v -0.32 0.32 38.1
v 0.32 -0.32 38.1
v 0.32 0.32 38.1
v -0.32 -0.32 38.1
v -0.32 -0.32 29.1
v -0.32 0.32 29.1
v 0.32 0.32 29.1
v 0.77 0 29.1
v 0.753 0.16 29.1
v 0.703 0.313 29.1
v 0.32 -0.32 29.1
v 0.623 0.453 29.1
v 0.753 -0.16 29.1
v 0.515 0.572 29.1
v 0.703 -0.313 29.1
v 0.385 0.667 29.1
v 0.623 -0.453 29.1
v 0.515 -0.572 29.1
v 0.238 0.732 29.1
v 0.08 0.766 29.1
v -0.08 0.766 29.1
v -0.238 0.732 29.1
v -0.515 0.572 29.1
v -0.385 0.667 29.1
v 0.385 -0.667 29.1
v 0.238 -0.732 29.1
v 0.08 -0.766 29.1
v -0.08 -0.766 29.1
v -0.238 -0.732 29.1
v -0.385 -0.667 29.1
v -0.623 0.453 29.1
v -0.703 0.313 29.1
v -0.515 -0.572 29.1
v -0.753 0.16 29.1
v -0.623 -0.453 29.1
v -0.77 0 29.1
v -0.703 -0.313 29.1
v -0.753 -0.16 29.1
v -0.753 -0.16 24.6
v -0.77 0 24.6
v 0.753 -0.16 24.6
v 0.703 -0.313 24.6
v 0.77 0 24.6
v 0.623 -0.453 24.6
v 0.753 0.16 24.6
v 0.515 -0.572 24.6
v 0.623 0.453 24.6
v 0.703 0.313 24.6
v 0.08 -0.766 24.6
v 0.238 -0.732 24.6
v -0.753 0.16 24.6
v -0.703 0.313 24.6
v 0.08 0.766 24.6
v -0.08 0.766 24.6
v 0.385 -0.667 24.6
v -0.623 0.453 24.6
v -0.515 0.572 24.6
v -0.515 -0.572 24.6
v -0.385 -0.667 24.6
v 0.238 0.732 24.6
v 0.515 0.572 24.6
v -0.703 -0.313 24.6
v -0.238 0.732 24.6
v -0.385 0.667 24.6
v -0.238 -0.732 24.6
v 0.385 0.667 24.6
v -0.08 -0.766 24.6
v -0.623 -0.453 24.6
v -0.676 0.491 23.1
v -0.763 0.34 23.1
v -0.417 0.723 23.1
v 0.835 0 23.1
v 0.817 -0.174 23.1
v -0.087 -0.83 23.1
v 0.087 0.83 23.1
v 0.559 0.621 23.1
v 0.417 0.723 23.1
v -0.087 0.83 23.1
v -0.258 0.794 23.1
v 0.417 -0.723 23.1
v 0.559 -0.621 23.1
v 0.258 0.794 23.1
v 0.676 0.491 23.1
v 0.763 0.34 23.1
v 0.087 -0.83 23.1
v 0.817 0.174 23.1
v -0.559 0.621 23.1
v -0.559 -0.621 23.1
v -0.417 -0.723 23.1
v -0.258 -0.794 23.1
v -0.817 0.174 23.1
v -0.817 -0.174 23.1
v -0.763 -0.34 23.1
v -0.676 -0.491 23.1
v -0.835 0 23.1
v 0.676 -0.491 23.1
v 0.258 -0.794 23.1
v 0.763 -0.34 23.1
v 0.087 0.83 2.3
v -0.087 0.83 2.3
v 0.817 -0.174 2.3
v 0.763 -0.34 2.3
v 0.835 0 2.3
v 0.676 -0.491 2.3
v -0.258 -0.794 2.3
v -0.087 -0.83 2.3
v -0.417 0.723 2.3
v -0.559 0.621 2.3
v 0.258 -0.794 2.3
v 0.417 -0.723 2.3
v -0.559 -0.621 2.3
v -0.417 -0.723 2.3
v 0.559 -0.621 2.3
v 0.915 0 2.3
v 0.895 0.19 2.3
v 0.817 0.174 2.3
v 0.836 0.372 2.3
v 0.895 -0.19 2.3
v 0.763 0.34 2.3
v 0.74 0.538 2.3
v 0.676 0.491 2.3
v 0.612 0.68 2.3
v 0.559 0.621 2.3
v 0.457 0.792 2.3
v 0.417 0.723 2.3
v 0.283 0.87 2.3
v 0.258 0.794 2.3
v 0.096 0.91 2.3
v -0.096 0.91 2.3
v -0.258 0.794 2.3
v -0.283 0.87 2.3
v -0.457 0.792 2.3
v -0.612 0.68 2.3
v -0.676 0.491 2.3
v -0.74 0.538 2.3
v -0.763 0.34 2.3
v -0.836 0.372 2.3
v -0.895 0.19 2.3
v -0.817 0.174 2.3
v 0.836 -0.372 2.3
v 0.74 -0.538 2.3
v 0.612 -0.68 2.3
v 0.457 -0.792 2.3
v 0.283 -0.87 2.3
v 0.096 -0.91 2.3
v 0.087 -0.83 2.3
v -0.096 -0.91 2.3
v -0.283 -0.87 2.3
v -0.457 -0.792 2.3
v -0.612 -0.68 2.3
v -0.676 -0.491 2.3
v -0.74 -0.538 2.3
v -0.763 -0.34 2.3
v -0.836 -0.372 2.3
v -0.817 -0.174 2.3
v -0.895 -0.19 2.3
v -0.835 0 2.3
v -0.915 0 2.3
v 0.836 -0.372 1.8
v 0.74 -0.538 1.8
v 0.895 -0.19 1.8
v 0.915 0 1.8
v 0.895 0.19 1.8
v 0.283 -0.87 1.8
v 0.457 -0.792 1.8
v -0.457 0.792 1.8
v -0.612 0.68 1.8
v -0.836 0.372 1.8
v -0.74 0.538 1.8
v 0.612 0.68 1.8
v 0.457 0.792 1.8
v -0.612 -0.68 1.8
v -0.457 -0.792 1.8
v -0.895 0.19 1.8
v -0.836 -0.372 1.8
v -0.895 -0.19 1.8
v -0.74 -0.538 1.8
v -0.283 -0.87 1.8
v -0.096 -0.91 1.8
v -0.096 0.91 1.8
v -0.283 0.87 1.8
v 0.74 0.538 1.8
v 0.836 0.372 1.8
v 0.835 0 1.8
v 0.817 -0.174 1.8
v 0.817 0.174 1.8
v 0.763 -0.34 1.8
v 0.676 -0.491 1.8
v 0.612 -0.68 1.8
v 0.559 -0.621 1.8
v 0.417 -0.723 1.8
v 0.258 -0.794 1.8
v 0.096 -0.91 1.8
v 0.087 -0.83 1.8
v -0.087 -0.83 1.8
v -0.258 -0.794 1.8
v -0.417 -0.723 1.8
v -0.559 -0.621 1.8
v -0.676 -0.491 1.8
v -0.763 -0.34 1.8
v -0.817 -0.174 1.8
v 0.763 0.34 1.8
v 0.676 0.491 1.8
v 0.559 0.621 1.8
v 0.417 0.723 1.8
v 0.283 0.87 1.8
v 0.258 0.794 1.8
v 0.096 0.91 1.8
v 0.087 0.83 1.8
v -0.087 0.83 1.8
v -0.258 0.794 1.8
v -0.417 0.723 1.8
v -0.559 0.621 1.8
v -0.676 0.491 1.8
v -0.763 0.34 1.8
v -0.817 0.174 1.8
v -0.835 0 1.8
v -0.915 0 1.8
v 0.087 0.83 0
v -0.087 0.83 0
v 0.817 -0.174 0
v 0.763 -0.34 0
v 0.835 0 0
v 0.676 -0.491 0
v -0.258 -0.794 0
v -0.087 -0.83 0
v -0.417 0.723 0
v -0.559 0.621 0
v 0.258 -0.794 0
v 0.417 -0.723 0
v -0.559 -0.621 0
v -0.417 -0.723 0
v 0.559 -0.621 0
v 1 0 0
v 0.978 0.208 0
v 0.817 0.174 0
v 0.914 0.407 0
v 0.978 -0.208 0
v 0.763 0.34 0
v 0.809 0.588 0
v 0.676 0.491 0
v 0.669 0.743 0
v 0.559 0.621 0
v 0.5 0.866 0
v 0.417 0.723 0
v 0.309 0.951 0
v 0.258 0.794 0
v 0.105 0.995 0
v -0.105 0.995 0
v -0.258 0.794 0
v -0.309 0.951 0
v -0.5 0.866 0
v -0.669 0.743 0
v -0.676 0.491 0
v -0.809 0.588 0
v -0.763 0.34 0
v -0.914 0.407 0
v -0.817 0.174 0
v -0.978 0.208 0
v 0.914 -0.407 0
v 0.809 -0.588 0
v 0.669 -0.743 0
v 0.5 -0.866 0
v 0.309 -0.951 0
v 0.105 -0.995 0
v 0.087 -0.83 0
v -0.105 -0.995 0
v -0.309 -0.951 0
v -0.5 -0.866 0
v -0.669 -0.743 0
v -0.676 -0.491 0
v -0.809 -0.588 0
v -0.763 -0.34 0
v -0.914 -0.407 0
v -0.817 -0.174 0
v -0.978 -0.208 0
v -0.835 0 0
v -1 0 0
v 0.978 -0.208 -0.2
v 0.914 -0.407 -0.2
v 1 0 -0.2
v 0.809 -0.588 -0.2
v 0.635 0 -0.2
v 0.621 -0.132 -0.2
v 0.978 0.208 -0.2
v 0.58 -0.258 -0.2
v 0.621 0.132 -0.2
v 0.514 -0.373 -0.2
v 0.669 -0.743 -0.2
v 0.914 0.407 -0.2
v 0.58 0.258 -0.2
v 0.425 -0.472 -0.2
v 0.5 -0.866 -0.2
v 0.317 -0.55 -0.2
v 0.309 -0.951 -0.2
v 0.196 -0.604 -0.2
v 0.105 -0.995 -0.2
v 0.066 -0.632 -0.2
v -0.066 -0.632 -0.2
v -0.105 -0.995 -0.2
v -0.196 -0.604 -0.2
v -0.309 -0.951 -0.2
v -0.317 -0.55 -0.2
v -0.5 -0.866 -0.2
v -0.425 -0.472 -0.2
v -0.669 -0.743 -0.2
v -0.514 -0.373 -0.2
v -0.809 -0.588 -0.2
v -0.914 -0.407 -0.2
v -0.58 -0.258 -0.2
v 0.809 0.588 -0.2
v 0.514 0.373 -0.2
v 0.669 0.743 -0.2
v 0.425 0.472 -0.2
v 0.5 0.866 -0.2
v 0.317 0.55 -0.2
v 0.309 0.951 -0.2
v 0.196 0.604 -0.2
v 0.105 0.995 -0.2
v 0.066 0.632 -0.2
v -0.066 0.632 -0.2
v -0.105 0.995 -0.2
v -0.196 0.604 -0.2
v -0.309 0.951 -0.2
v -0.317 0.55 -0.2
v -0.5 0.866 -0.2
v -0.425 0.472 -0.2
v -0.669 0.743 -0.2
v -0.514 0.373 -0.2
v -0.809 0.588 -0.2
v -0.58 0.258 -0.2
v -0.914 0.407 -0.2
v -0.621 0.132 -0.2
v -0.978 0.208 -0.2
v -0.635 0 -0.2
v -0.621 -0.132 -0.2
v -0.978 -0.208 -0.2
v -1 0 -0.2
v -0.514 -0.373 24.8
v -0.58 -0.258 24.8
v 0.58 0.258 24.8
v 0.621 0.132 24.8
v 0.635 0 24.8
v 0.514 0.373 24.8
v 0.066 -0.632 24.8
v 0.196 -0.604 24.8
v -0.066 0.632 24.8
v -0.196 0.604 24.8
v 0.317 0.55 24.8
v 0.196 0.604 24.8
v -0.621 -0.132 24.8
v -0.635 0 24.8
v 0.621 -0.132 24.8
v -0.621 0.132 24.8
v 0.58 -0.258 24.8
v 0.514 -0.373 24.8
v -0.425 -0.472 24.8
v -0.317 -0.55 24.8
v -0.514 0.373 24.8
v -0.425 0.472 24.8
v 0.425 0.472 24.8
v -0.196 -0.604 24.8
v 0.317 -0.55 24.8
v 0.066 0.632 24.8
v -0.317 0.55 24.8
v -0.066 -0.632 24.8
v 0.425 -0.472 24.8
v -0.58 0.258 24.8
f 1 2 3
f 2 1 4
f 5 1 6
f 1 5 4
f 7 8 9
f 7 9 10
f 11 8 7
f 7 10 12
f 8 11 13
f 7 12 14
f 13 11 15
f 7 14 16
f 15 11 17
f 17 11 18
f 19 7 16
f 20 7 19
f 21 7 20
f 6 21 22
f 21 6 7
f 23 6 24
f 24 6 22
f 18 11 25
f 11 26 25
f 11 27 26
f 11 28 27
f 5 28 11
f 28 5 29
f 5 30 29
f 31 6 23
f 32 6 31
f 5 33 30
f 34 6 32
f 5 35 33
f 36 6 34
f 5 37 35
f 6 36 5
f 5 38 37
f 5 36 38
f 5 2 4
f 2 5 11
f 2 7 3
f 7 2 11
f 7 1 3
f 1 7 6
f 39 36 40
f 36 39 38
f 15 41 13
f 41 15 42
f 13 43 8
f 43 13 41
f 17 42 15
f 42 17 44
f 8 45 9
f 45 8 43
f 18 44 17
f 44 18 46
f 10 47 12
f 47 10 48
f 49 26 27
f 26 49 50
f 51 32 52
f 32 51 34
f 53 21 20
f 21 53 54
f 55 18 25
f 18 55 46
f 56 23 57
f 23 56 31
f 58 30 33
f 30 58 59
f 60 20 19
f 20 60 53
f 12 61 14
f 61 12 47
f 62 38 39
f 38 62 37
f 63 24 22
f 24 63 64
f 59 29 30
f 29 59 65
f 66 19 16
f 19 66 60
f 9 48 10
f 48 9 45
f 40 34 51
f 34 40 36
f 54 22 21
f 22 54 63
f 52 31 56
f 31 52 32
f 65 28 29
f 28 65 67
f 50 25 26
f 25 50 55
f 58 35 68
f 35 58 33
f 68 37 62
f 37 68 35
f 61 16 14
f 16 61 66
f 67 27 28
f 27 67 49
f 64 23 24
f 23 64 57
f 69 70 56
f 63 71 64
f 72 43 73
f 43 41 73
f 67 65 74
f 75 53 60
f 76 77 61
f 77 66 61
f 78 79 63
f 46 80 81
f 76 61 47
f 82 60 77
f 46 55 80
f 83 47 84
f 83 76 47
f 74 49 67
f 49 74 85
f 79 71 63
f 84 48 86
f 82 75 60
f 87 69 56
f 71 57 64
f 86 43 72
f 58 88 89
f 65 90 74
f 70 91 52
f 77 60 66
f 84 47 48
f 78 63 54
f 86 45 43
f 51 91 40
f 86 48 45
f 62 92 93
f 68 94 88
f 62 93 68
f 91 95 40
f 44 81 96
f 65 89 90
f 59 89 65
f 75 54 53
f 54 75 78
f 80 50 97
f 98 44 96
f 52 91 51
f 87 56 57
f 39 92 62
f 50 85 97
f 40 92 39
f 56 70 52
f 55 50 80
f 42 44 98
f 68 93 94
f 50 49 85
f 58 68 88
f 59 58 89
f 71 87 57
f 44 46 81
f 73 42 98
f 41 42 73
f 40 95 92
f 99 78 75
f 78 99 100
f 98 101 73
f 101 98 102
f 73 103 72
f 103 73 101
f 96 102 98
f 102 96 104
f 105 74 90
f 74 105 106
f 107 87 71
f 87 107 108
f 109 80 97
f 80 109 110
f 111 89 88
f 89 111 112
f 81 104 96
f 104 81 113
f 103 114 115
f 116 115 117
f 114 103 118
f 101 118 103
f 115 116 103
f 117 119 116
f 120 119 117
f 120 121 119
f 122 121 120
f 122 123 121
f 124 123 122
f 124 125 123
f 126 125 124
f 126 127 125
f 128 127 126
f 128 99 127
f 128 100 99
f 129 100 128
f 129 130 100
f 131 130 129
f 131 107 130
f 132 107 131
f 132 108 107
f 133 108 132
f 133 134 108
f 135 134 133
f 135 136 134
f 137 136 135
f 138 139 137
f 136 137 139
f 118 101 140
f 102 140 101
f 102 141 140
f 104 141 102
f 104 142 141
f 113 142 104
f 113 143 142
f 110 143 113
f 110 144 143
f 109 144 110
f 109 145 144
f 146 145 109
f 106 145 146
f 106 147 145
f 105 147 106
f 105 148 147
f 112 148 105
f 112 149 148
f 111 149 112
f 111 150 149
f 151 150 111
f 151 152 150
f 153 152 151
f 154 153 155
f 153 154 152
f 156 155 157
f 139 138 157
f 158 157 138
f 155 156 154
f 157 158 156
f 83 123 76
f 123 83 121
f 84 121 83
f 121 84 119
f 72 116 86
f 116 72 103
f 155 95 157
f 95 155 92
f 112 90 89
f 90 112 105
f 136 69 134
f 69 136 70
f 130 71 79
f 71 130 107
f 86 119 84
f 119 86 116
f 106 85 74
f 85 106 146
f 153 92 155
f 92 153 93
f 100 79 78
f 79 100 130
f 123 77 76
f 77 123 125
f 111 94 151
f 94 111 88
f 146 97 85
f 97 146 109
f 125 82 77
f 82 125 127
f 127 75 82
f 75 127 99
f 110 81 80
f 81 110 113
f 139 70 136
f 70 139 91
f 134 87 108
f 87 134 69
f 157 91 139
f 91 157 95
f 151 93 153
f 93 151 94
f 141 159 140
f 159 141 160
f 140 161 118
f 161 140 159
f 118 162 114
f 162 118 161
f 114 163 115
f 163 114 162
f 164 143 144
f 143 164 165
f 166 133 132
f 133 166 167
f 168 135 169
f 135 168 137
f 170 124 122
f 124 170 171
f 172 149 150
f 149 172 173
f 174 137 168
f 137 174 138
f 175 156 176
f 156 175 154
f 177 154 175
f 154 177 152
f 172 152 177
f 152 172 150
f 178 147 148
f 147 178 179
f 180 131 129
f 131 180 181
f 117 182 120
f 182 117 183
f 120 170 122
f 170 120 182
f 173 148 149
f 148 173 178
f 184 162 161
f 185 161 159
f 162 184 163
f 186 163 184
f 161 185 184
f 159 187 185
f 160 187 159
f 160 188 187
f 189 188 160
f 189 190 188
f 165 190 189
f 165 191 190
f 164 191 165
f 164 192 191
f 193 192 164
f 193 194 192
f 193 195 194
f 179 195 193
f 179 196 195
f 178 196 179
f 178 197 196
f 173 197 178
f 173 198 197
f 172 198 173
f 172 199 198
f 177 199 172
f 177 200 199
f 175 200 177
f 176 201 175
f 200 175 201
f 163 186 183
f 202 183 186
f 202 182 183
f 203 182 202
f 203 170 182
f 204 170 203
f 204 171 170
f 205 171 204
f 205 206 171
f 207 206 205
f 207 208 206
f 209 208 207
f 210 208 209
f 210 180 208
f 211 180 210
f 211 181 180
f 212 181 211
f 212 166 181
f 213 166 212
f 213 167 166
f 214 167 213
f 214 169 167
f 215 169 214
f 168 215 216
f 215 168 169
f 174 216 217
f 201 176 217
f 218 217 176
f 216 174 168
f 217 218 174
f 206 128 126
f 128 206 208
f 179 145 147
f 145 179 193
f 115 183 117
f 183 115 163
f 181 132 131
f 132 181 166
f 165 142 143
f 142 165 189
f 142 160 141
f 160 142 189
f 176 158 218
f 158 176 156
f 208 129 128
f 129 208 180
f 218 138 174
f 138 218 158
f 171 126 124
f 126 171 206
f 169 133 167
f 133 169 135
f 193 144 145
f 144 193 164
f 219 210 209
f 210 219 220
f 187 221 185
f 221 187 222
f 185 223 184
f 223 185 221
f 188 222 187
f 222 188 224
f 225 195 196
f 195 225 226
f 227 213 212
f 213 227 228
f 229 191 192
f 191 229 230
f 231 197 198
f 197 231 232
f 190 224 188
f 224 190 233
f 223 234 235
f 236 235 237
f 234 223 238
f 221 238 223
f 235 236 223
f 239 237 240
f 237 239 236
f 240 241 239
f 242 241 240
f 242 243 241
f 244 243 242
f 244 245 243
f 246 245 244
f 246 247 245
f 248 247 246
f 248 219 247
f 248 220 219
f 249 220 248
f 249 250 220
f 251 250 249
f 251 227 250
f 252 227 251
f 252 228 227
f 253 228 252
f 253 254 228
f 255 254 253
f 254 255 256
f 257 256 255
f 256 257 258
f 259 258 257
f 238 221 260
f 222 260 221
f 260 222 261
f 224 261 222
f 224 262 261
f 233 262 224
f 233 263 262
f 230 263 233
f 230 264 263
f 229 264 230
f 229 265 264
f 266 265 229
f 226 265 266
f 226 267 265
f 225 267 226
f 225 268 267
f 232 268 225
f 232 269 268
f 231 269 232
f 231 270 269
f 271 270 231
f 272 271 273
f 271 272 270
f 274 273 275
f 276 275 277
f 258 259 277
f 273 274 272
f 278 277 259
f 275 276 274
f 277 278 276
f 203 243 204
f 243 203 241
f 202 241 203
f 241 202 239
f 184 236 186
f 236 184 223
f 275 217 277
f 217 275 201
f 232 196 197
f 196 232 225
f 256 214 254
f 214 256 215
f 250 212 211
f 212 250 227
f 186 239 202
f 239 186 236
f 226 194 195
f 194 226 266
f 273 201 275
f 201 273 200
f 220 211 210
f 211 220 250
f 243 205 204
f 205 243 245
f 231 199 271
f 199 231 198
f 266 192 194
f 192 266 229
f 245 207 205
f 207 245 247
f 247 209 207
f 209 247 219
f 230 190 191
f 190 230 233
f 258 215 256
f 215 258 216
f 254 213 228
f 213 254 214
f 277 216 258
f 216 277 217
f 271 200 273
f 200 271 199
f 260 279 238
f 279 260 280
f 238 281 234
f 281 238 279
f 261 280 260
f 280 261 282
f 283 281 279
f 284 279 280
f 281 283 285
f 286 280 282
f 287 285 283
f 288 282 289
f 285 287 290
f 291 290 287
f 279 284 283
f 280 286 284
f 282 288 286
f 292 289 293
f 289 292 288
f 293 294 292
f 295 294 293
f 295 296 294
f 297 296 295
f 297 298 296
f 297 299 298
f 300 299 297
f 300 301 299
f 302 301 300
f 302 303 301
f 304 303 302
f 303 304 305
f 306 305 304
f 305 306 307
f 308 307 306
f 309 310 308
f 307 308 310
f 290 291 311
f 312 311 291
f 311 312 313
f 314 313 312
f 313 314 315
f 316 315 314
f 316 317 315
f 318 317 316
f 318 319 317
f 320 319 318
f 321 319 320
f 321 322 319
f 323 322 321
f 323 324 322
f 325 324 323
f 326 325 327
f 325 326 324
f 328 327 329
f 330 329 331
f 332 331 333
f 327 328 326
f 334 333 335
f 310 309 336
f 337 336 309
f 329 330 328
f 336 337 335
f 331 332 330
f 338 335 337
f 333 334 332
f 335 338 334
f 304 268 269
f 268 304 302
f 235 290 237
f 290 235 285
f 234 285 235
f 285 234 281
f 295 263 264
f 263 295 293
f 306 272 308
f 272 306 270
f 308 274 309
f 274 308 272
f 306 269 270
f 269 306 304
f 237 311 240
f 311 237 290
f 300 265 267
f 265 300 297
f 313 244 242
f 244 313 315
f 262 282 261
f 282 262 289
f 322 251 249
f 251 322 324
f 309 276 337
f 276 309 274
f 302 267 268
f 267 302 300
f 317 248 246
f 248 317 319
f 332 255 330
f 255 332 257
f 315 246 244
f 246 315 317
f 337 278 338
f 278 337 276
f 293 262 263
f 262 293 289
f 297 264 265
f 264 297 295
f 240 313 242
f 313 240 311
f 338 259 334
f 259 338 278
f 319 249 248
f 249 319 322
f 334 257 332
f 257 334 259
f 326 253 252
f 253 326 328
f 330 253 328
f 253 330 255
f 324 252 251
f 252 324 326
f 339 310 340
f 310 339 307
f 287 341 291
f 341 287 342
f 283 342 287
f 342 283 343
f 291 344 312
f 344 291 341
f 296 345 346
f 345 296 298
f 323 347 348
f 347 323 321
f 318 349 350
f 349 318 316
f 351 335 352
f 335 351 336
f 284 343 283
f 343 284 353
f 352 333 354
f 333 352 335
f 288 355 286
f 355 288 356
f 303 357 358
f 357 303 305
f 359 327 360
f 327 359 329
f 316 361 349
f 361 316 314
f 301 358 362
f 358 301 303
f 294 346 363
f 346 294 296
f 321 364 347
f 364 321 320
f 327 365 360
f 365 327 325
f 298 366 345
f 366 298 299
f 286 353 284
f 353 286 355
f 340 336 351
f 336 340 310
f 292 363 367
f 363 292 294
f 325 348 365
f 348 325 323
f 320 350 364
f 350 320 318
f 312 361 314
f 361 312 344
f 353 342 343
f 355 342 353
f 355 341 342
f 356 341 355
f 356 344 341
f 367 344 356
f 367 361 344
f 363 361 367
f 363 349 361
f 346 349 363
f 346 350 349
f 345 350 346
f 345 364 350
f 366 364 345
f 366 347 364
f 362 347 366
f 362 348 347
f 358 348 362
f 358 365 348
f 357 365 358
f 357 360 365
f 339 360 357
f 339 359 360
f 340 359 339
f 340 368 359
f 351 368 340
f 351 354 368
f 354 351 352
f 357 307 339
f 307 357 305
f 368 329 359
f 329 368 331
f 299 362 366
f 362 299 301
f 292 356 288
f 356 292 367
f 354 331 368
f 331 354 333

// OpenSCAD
/* [Dimensions] */
base_length = 9;
base_side = 0.64;
crimp_diameter = 1.54;
crimp_length = 4.5;
taper_length = 1.5;
shaft_diameter = 1.67;
total_length = 38.3;
top_ring_length = 0.2;
top_ring_diameter = 2;
bottom_ring_length = 0.5;
bottom_ring_diameter = 1.83;
ring_separation = 2.5;

/* [Variables] */
through_all_height = 1000;


module R100_2W_frame(){
    /*
    Square base
    Crimped section connecting the shaft to the base
    Tapered section expanding to the shaft thickness
    cylindrical shaft
    Bottom ring
    shaft
    top ring
    
    linearly extrude from the base.
    */
    translate([0,0,total_length]) {
    rotate(180, [1, 0, 0]) {
    
    // z=0
    linear_extrude(base_length)
        square(base_side, center=true);
    
    // crimp
    //z=base_length
    translate([0,0,base_length])cylinder(crimp_length, d=crimp_diameter,center=false);
    
    //  taper
    // z=base_length+crimp_length
    translate([0,0,base_length+crimp_length])cylinder(taper_length, d2=shaft_diameter, d1=crimp_diameter ,center=false);

    //  bottom shaft    
    // z=base_length+crimp_length+taper_length
    bottom_shaft_length=total_length-(taper_length+base_length+crimp_length+ring_separation);
     
    //assert(bottom_shaft_length==20.8);
    translate([0,0,base_length+crimp_length+taper_length])cylinder(bottom_shaft_length, d=shaft_diameter,center=false);
    
    //  bottom ring
    // z=base_length+crimp_length+taper_length + bottom_shaft_length
    translate([0,0,base_length+crimp_length+taper_length+bottom_shaft_length])cylinder(bottom_ring_length, d=bottom_ring_diameter,center=false);
    
    //  ring separation shaft
    //  z=base_length+crimp_length+taper_length + bottom_shaft_length+bottom_ring_length
    //  ring_separation is bottom of bottom to top of top

    ring_separation_shaft_length = ring_separation-top_ring_length-bottom_ring_length;
    translate([0,0,base_length+crimp_length+taper_length+bottom_shaft_length+bottom_ring_length])cylinder(ring_separation_shaft_length, d=shaft_diameter,center=false);
    
    
    // top ring
    //z=base_length+crimp_length+taper_length + bottom_shaft_length+ring_separation-bottom_ring_length-top_ring_length
    translate([0,0,total_length-top_ring_length])cylinder(top_ring_length, d=top_ring_diameter,center=false);
    
    //color("yellow")
    //translate([0,0,7.8+7.62])cylinder(h=1,d=1.46,center=false);
    z=base_length+crimp_length+taper_length + bottom_shaft_length+ring_separation;
    };
    };
}

module R100_2W(){
    //  Put hole in model
    translate([0,0,-top_ring_length])
    difference(){
        R100_2W_frame();
        hole_depth=25;
        cylinder(d=1.27, h=2*hole_depth, center=true);
    };
}


module R100_2W_pinhole() {
    ate_shaft_diameter = shaft_diameter;
    ate_bottom_lip_diameter = bottom_ring_diameter;
    ate_top_lip_diameter = top_ring_diameter;
    ate_lip_separation = ring_separation; //  center to center
   
    hole_size_margin = 0.1;
    shaft_hole_diameter = ate_shaft_diameter + hole_size_margin;
    bottom_lip_hole_diameter = ate_bottom_lip_diameter + hole_size_margin;
    top_lip_hole_diameter = ate_top_lip_diameter + hole_size_margin;
    
    //  through all holes, is symetrical and large
    cylinder(h=through_all_height, d=shaft_hole_diameter, center=true);
    
    //  top dimple wider bore, starts from the depth passed in and cuts up
    top_counter_bore_depth = 0;  //  tell the function where we want to top of the pin to be
    translate([0, 0, top_counter_bore_depth])cylinder(h=through_all_height, d=top_lip_hole_diameter, center=false);

    //  bottom dimple narrower bore, starts from the depth of the upper minus the separation
    bottom_counter_bore_depth = -ate_lip_separation;
    translate([0, 0, bottom_counter_bore_depth])cylinder(h=through_all_height, d=bottom_lip_hole_diameter, center=false);
};

$fs=0.1;
R100_2W();
//R100_2W_pinhole();
